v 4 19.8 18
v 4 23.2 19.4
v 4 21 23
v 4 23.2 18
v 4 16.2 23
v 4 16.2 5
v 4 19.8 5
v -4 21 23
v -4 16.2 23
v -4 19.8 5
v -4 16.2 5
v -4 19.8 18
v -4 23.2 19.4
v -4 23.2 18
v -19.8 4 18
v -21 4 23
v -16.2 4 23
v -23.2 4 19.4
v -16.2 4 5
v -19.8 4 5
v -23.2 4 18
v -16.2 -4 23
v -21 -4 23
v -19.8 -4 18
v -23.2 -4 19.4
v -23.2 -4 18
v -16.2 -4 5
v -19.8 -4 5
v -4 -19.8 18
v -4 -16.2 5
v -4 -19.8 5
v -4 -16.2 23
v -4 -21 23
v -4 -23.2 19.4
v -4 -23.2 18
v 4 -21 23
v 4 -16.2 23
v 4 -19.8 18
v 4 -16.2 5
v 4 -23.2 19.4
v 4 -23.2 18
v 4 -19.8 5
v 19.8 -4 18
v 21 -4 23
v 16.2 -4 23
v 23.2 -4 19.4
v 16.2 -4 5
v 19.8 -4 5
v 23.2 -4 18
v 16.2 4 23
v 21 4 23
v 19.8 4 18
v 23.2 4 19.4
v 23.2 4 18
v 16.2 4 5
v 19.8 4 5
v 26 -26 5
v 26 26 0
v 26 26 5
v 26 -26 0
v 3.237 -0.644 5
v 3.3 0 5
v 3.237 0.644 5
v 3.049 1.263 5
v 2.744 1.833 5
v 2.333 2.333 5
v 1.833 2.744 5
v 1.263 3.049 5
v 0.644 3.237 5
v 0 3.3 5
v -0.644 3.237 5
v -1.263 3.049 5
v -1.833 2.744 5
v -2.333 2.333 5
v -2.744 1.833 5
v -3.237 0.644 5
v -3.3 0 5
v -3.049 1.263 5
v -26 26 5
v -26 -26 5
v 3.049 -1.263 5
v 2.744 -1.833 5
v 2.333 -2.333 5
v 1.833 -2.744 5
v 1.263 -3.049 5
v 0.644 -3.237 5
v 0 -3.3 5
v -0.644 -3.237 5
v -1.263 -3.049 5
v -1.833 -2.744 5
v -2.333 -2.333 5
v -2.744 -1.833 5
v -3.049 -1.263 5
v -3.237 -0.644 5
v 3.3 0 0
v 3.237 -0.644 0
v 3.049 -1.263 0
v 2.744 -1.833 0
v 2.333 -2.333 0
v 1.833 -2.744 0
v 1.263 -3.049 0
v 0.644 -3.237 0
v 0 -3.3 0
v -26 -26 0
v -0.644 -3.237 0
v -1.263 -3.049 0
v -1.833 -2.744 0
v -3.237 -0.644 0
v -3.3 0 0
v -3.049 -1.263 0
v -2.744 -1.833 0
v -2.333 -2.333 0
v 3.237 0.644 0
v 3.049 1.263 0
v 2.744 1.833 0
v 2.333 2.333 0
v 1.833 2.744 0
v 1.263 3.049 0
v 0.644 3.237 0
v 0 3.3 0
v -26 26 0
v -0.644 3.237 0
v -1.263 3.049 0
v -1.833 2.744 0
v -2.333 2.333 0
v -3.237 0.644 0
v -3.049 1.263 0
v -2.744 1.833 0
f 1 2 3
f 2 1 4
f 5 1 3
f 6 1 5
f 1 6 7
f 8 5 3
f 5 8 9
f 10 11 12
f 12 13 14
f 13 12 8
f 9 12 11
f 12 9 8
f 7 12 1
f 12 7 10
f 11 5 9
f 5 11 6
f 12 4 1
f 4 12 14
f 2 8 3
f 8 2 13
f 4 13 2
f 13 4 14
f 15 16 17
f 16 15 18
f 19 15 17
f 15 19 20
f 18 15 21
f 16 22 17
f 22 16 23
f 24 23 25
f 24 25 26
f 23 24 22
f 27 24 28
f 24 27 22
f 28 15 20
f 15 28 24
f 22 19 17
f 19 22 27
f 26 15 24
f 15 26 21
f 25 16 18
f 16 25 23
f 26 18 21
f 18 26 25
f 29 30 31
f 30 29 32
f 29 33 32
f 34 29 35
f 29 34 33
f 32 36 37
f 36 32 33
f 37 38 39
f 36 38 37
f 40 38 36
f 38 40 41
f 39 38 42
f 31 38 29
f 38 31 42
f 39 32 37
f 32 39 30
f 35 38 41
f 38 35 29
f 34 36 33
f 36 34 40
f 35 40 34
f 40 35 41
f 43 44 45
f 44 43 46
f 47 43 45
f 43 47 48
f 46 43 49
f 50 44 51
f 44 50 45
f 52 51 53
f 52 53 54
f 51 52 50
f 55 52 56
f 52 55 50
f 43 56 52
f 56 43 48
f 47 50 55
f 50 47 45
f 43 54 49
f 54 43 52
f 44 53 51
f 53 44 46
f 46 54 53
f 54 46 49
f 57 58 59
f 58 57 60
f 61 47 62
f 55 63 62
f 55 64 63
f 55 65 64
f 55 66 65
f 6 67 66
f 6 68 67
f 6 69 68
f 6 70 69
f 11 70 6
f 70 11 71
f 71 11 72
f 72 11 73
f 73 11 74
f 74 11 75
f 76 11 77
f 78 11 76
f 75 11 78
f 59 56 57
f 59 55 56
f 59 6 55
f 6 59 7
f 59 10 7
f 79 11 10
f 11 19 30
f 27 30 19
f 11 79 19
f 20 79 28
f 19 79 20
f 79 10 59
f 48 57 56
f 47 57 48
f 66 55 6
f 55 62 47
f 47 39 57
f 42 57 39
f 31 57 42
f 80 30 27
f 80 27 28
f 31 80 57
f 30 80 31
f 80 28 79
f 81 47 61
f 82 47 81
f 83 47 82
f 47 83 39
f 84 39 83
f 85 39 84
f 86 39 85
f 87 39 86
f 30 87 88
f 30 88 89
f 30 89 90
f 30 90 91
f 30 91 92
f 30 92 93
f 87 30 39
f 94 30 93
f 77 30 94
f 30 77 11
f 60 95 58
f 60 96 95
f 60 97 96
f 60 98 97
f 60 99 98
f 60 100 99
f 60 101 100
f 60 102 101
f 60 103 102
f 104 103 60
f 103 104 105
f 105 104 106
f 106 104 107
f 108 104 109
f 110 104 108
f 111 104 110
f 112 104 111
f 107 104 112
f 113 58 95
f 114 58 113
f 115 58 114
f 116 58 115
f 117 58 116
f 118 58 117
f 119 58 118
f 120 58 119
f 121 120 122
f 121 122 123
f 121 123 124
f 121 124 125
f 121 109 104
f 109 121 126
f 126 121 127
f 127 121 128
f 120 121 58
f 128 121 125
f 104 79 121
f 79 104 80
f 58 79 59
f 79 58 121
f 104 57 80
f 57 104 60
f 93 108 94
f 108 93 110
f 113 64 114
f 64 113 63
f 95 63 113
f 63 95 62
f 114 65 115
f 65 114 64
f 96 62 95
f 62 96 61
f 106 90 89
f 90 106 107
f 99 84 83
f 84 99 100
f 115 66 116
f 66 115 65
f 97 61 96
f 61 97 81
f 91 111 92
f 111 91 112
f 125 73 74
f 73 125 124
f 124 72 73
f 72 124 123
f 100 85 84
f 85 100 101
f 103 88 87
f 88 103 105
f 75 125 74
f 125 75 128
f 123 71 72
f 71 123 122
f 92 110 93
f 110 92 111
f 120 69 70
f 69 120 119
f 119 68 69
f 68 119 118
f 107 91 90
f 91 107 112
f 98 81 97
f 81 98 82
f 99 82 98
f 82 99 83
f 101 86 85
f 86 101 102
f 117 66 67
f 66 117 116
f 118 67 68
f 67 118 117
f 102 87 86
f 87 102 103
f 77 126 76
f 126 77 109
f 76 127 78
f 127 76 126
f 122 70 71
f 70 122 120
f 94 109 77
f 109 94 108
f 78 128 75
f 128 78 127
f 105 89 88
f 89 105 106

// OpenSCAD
$fn = 32;

// ----------------------------------------------------------------------
// Snap-fit latch: 4 arms, 18 mm tall, 3.6 mm undercut hooks
// ----------------------------------------------------------------------

// --- parameters (mm) ---
base_d = 52;              // base plate depth
base_h = 5;               // base plate thickness
span = 36;                // distance between opposite arms
arm_t = 3.6;              // arm thickness
arm_d = 8;                // arm width
height = 18;              // free arm length
head_len = 3.6;           // hook reach
head_h = 5;               // hook height
lead = 1.4;               // lead-in ramp thickness
bore_d = 6.6;             // base fixing bore
top_z = 23;               // height of the arm tips above the base

arms = 4;

difference() {
  union() {
    /* base plate, centred on the arm ring */
    translate([-26, -26, 0]) cube([base_d, base_d, base_h]);
    for (a = [0 : 360 / arms : 359]) rotate([0, 0, a]) {
    /* arm, sunk 0.5 mm into the base */
    translate([-arm_d / 2, span / 2 - arm_t / 2, base_h - 0.5]) cube([arm_d, arm_t, height + 0.5]);
    /* hook: a convex hull of a tall inner block and a thin outer lip
       gives a flat undercut below and a lead-in ramp on top */
    hull() {
      translate([-arm_d / 2, span / 2 + arm_t / 2 - 0.6, top_z - head_h]) cube([arm_d, lead + 0.4, head_h]);
      translate([-arm_d / 2, span / 2 + arm_t / 2 - 0.2, top_z - head_h]) cube([arm_d, head_len, lead]);
    }
    }
  }
  translate([0, 0, -2.5]) cylinder(h = base_h + 5, d = bore_d);
}
